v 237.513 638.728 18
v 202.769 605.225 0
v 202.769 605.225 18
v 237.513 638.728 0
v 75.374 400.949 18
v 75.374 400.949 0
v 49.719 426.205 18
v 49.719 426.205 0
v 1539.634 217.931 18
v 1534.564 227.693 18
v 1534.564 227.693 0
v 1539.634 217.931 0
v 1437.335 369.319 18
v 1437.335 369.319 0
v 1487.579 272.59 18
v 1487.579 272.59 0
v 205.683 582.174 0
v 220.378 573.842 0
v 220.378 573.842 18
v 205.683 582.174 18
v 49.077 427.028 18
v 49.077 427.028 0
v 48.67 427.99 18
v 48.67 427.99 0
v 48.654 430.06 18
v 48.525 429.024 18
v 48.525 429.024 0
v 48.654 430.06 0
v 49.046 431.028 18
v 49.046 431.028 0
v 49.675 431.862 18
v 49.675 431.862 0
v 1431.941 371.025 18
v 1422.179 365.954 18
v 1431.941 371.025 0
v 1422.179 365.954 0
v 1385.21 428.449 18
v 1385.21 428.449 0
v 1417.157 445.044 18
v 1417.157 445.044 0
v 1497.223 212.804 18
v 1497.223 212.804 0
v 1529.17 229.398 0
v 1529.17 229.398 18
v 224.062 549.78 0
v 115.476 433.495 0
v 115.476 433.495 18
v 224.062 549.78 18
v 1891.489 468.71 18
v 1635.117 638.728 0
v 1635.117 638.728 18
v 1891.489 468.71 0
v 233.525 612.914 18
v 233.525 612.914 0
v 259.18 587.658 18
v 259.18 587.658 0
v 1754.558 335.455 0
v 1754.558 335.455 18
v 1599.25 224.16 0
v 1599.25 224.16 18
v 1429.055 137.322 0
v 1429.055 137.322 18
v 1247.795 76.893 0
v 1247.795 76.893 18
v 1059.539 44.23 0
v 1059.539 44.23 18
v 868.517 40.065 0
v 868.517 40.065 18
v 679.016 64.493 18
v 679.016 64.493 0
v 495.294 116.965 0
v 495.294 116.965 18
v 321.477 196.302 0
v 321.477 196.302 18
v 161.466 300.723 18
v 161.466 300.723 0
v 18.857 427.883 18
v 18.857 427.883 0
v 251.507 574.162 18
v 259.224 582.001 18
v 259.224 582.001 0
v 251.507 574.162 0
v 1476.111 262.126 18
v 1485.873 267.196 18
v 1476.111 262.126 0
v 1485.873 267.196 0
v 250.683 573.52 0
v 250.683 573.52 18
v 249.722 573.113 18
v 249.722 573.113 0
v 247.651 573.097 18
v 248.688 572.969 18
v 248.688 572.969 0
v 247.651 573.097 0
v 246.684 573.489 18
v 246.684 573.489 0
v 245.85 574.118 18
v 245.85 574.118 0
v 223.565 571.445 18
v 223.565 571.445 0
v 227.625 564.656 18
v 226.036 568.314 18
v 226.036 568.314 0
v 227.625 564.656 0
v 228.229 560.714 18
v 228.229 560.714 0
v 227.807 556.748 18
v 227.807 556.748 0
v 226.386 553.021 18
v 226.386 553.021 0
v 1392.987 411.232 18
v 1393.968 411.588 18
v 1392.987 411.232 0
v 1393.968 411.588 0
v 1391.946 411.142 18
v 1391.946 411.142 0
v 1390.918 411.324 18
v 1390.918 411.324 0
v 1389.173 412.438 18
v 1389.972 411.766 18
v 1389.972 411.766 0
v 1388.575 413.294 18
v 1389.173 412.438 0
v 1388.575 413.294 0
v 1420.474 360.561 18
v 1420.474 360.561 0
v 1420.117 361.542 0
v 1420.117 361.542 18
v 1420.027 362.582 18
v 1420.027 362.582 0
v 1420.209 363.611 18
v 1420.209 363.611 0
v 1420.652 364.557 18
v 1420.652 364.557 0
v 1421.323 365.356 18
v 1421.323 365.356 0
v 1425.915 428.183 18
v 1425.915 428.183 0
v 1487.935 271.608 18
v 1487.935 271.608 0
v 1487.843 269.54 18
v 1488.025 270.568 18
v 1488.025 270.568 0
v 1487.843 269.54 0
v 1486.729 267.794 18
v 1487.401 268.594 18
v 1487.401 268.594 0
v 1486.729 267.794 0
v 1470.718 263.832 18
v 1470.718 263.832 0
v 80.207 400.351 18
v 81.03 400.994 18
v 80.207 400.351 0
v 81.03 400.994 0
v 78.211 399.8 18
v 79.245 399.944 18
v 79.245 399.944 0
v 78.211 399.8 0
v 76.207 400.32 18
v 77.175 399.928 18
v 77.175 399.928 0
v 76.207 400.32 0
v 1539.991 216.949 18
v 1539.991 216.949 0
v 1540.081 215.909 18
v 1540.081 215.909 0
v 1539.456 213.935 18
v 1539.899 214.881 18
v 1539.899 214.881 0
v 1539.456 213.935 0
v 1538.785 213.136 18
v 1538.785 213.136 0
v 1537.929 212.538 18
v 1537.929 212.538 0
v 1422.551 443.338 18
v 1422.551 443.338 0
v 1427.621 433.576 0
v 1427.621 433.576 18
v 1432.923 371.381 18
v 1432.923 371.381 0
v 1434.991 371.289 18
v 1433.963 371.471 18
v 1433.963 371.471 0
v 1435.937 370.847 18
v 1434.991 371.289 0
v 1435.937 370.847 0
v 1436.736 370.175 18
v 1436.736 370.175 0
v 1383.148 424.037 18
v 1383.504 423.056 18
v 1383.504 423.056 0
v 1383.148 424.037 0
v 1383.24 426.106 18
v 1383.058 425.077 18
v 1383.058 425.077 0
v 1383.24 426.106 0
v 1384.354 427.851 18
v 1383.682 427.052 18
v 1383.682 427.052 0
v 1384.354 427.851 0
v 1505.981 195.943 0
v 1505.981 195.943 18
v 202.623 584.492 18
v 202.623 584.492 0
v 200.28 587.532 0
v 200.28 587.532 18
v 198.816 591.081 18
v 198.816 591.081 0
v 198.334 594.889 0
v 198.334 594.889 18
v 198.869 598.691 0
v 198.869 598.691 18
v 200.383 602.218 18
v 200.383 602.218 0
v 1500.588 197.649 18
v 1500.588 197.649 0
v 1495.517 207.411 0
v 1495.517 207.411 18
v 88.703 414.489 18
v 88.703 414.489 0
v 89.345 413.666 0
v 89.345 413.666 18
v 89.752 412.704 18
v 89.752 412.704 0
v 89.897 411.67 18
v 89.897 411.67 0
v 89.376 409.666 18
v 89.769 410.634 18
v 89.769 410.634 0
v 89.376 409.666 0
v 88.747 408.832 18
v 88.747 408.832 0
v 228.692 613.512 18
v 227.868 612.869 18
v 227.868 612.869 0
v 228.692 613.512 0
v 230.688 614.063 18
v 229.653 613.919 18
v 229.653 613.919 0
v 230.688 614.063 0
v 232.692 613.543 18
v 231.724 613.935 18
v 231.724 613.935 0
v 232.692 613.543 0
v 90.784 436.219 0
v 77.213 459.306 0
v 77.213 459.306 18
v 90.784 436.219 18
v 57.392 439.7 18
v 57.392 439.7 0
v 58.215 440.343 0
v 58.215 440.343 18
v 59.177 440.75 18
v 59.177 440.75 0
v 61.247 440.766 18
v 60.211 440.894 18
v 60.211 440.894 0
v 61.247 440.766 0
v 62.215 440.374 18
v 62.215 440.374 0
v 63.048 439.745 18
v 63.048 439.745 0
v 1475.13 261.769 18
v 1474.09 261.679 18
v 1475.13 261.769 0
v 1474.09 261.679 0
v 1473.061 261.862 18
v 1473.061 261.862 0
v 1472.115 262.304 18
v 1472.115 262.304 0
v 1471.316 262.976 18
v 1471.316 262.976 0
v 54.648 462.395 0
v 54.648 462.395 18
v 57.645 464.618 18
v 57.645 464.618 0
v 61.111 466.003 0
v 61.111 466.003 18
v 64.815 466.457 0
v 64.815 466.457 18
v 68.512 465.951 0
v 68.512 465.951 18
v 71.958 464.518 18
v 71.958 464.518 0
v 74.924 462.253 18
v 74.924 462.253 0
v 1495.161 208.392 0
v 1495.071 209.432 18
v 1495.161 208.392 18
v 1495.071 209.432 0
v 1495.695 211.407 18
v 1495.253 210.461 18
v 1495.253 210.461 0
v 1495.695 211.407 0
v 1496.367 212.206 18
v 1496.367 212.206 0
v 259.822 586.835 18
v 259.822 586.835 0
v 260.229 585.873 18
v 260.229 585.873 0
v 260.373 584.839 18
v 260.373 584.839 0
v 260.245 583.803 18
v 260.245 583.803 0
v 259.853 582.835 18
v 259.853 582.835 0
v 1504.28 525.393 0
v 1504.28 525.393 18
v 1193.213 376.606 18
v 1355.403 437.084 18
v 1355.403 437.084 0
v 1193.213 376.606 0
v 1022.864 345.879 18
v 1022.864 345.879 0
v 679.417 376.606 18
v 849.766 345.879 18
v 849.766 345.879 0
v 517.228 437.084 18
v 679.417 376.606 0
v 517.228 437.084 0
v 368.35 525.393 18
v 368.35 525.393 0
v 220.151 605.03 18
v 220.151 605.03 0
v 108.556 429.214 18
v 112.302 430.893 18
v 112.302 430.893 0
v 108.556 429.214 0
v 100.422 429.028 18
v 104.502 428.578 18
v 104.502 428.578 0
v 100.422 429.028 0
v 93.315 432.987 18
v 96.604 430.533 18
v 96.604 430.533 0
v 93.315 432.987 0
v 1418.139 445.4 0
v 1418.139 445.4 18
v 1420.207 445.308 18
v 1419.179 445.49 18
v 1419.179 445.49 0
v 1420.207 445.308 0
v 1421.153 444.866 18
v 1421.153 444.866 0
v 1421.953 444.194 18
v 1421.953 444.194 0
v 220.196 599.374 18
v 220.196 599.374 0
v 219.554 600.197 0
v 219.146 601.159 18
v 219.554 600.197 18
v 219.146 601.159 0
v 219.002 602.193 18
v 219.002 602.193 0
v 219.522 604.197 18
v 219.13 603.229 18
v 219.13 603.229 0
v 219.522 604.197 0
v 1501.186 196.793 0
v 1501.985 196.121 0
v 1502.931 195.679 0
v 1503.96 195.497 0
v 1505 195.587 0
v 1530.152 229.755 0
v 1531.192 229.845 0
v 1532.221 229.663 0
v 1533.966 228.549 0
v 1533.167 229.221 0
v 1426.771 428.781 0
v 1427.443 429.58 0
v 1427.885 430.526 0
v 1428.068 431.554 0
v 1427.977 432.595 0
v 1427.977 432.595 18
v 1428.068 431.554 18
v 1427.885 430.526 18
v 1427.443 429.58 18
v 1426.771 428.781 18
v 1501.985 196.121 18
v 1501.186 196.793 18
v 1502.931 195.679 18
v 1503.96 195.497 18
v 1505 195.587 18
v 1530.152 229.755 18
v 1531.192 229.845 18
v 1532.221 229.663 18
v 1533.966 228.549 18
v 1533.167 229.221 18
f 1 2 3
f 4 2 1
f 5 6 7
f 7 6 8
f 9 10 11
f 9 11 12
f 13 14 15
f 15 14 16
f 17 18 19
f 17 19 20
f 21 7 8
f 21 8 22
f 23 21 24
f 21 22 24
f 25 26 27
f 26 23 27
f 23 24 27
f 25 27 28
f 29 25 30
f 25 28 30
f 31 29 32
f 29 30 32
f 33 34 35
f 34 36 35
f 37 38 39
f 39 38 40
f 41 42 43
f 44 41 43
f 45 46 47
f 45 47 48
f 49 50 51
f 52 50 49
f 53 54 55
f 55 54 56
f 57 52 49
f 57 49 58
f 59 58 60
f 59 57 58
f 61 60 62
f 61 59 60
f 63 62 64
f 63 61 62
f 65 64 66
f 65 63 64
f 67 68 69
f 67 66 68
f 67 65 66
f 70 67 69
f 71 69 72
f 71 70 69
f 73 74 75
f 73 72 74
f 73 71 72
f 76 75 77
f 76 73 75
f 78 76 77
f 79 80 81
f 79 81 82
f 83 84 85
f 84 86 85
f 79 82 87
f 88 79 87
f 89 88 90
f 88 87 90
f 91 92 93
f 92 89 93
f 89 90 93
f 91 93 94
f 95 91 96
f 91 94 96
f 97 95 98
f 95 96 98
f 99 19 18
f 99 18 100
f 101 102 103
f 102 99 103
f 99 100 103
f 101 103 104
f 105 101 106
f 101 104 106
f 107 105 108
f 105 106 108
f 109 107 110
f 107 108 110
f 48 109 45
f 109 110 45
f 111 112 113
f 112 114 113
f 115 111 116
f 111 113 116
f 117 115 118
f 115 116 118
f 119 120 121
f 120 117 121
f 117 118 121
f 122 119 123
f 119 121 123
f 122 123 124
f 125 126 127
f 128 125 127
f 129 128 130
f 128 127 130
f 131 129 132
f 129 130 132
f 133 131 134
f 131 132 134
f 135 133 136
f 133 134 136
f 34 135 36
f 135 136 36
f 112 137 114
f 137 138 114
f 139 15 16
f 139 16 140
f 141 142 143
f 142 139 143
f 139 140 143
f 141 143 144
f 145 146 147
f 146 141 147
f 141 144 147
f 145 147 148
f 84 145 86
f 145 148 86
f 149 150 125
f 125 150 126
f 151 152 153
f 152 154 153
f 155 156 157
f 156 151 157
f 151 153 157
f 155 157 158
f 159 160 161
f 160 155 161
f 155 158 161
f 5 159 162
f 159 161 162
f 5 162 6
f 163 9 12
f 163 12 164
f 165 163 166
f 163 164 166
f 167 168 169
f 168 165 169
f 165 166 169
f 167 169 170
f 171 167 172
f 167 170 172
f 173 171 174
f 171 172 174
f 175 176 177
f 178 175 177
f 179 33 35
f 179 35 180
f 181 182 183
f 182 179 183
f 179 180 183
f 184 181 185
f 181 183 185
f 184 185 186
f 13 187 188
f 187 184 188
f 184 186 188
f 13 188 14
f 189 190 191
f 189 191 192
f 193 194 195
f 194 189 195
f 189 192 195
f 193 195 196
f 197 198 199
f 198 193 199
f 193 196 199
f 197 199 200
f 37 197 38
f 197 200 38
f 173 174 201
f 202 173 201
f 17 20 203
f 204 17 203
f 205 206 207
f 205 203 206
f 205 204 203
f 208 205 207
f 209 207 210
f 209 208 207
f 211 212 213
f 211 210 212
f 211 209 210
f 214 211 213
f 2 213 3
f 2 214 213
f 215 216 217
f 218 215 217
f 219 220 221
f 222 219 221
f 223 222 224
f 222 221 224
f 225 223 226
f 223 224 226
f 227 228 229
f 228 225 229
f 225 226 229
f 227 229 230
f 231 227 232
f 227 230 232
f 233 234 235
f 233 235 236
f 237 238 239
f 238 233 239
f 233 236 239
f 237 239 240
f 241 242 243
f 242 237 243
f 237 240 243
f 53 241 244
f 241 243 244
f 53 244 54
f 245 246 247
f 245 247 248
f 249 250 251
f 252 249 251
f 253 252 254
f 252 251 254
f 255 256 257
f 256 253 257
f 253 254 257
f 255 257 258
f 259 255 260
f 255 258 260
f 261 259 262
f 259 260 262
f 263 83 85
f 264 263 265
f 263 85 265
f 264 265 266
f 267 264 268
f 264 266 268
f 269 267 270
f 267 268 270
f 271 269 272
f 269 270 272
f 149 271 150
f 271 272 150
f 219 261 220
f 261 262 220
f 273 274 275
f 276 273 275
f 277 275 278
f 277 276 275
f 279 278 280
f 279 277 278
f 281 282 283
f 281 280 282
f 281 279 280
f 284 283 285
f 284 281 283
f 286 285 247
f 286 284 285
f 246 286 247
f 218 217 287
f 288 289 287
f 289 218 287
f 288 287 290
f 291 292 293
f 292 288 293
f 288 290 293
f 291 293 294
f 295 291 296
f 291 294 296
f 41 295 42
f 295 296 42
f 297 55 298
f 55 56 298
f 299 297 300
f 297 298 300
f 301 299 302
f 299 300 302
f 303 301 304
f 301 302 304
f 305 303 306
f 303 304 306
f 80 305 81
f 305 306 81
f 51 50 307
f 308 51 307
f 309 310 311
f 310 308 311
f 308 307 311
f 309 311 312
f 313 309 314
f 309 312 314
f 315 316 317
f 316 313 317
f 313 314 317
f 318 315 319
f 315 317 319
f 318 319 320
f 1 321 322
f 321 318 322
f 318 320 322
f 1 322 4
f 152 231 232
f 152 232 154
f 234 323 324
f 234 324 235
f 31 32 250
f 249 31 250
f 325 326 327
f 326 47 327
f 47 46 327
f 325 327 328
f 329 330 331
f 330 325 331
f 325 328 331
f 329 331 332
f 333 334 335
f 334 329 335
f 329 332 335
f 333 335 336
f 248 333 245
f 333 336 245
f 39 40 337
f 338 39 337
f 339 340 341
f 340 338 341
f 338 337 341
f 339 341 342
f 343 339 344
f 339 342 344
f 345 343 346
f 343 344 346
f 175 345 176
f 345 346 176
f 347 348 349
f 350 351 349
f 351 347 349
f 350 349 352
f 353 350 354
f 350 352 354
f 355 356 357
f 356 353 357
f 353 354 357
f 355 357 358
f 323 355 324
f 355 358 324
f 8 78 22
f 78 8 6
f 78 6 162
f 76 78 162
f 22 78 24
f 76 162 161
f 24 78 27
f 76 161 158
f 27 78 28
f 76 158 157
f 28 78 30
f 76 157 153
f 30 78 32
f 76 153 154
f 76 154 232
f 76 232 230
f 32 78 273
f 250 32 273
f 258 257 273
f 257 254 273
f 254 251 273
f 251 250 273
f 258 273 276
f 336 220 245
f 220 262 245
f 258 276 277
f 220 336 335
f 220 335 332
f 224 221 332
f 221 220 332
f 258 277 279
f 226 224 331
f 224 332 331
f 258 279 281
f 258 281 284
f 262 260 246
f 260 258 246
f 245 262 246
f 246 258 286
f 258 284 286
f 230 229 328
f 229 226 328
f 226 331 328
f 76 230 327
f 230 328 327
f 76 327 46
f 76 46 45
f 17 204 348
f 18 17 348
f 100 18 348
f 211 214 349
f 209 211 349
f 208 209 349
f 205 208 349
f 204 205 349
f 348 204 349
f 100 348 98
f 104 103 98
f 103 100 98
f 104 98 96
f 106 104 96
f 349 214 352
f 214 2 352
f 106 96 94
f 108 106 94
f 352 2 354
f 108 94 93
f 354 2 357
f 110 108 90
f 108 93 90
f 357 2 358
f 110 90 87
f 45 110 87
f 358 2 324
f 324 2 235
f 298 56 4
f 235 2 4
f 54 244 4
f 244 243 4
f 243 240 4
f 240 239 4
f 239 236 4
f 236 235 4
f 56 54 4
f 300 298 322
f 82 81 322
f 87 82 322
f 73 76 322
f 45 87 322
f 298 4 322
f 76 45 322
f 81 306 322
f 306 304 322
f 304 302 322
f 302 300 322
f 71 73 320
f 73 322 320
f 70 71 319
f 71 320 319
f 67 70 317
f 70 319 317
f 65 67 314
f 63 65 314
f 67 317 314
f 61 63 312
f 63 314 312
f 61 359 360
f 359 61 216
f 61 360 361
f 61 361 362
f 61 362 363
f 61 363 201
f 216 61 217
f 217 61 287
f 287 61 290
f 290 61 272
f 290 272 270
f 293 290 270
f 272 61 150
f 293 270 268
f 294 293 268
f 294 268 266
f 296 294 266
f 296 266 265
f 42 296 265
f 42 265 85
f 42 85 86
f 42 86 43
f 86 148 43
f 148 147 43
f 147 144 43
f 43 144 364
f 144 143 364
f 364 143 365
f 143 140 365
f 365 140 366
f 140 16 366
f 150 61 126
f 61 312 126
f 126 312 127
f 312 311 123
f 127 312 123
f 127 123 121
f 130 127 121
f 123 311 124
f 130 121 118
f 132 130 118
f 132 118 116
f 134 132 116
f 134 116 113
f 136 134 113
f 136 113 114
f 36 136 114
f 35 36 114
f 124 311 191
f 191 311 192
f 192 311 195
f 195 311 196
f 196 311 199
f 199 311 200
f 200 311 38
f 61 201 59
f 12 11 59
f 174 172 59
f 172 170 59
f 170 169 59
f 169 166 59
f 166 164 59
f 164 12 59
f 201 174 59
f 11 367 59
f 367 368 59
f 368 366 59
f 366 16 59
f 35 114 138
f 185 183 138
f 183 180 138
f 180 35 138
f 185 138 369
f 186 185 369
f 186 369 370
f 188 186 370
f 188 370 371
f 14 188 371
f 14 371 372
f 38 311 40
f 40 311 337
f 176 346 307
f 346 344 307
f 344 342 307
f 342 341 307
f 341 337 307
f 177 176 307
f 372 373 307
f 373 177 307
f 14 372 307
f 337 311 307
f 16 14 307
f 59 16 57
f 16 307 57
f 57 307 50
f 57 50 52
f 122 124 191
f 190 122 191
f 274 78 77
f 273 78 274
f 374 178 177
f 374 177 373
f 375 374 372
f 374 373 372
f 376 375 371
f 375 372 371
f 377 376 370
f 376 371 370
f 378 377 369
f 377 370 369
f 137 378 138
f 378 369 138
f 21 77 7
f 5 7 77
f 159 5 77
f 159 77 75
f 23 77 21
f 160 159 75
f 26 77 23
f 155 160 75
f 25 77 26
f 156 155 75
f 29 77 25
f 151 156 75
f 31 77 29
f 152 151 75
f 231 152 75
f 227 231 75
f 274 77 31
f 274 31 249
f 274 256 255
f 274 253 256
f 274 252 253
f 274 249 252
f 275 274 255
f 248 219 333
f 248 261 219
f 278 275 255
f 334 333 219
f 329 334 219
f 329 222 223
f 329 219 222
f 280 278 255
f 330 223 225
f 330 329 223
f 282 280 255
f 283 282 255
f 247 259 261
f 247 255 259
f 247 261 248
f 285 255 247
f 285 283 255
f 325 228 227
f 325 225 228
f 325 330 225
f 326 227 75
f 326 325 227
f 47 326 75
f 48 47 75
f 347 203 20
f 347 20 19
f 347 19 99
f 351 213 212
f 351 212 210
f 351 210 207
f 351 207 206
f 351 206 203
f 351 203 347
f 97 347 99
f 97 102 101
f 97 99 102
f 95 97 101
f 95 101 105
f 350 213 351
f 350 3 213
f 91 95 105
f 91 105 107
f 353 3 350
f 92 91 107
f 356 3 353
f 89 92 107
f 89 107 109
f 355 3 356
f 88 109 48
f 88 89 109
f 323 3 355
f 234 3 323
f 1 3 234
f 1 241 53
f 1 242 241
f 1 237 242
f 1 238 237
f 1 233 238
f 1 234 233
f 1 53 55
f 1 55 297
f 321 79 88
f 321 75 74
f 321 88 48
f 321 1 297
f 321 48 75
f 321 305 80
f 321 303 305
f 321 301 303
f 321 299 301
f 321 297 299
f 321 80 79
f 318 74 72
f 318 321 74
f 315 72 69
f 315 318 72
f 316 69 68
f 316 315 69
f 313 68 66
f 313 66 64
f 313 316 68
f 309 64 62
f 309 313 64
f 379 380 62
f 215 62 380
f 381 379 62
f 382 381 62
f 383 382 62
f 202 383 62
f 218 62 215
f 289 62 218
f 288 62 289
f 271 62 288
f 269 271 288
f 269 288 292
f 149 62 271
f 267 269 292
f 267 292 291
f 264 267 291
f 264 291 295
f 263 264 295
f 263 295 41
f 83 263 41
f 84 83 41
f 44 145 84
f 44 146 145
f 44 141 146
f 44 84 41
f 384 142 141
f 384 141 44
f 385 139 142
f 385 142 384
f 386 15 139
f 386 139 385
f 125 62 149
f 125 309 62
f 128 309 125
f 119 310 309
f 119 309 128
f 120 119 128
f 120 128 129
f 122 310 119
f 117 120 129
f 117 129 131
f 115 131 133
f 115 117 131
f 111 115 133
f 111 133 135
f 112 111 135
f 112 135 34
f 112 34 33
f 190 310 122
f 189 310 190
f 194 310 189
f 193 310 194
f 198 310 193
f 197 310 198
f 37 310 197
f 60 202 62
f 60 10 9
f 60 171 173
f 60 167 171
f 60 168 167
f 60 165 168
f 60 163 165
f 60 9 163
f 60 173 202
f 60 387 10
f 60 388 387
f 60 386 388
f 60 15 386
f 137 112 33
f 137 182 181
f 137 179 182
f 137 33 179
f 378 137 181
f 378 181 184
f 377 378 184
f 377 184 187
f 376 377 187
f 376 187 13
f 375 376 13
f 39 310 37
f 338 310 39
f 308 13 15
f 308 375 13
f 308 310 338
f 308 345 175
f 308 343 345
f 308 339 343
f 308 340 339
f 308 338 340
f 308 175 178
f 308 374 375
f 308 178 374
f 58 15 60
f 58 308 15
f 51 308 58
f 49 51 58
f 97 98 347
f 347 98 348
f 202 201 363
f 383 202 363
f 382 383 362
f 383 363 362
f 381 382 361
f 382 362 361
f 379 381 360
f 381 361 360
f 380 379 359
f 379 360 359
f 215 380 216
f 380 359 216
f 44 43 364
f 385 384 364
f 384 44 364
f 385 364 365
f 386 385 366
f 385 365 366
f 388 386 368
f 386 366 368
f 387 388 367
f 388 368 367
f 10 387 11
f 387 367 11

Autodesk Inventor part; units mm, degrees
ref_plane "YZ Plane" through (0, 0, 0) normal (1, 0, 0) x (0, 1, 0)
ref_plane "XZ Plane" through (0, 0, 0) normal (0, 1, 0) x (-1, 0, 0)
ref_plane "XY Plane" through (0, 0, 0) normal (0, 0, 1) x (1, 0, 0)
sketch "CONTOURS" plane through (0, 0, 0) normal (0, 0, 1) x (1, 0, 0)
  arc A0 (18.8569, 427.8827) -> (1891.4893, 468.7097) centre (936.3152, 1313.2613) ccw
  line L0 (18.8569, 427.8827) -> (54.648, 462.3952)
  arc A1 (77.2131, 459.3056) -> (54.648, 462.3952) centre (64.7129, 451.9575) ccw
  line L1 (77.2131, 459.3056) -> (90.7845, 436.2188)
  arc A2 (90.7845, 436.2188) -> (115.4755, 433.495) centre (104.1468, 444.0737) ccw
  line L2 (115.4755, 433.495) -> (224.0619, 549.7797)
  arc A3 (224.0619, 549.7797) -> (220.3778, 573.8421) centre (212.7332, 560.3584) ccw
  line L3 (220.3778, 573.8421) -> (205.6826, 582.1735)
  arc A4 (202.7691, 605.2251) -> (205.6826, 582.1735) centre (212.834, 594.7873) ccw
  line L4 (202.7691, 605.2251) -> (237.5129, 638.7277)
  arc A5 (237.5129, 638.7277) -> (1635.1174, 638.7277) centre (936.3152, 1313.2613) ccw
  line L5 (1635.1174, 638.7277) -> (1891.4893, 468.7097)
sketch "HOLES" plane through (0, 0, 0) normal (0, 0, 1) x (1, 0, 0)
  arc A0 (75.3736, 400.9492) -> (81.0303, 400.9936) centre (78.1798, 403.7997) ccw
  line L0 (75.3736, 400.9492) -> (49.7191, 426.2049)
  arc A1 (49.6748, 431.8616) -> (49.7191, 426.2049) centre (52.5253, 429.0554) ccw
  line L1 (49.6748, 431.8616) -> (57.3918, 439.7004)
  arc A2 (63.0485, 439.7447) -> (57.3918, 439.7004) centre (60.2423, 436.8942) ccw
  line L2 (63.0485, 439.7447) -> (88.703, 414.4891)
  arc A3 (88.7473, 408.8324) -> (88.703, 414.4891) centre (85.8968, 411.6386) ccw
  line L3 (1537.9287, 212.5375) -> (1505.9814, 195.9431)
  arc A4 (1500.5879, 197.6489) -> (1505.9814, 195.9431) centre (1504.1376, 199.4928) ccw
  line L4 (1500.5879, 197.6489) -> (1495.5174, 207.4106)
  arc A5 (1497.2233, 212.8041) -> (1495.5174, 207.4106) centre (1499.0671, 209.2544) ccw
  line L5 (1497.2233, 212.8041) -> (1529.1705, 229.3985)
  arc A6 (1534.564, 227.6927) -> (1529.1705, 229.3985) centre (1531.0143, 225.8489) ccw
  line L6 (1534.564, 227.6927) -> (1539.6345, 217.931)
  arc A7 (1537.9287, 212.5375) -> (1539.6345, 217.931) centre (1536.0848, 216.0872) ccw
  line L7 (1485.873, 267.1962) -> (1476.1114, 262.1257)
  arc A8 (1470.7179, 263.8316) -> (1476.1114, 262.1257) centre (1474.2676, 265.6754) ccw
  line L8 (1470.7179, 263.8316) -> (1420.4735, 360.5606)
  arc A9 (1422.1794, 365.9541) -> (1420.4735, 360.5606) centre (1424.0232, 362.4044) ccw
  line L9 (1422.1794, 365.9541) -> (1431.9411, 371.0247)
  arc A10 (1437.3346, 369.3188) -> (1431.9411, 371.0247) centre (1433.7849, 367.475) ccw
  line L10 (1437.3346, 369.3188) -> (1487.5789, 272.5898)
  arc A11 (1485.873, 267.1962) -> (1487.5789, 272.5898) centre (1484.0292, 270.7459) ccw
  line L11 (1388.5747, 413.294) -> (1383.5041, 423.0556)
  arc A12 (1385.21, 428.4491) -> (1383.5041, 423.0556) centre (1387.0538, 424.8994) ccw
  line L12 (1385.21, 428.4491) -> (1417.1572, 445.0436)
  arc A13 (1422.5507, 443.3377) -> (1417.1572, 445.0436) centre (1419.001, 441.4939) ccw
  line L13 (1422.5507, 443.3377) -> (1427.6212, 433.5761)
  arc A14 (1425.9154, 428.1826) -> (1427.6212, 433.5761) centre (1424.0716, 431.7322) ccw
  line L14 (1425.9154, 428.1826) -> (1393.9682, 411.5881)
  arc A15 (1388.5747, 413.294) -> (1393.9682, 411.5881) centre (1392.1243, 415.1378) ccw
  line L15 (220.1514, 605.0305) -> (227.8684, 612.8694)
  arc A16 (233.5251, 612.9137) -> (227.8684, 612.8694) centre (230.7189, 610.0632) ccw
  line L16 (233.5251, 612.9137) -> (259.1796, 587.658)
  arc A17 (259.2239, 582.0014) -> (259.1796, 587.658) centre (256.3734, 584.8075) ccw
  line L17 (259.2239, 582.0014) -> (251.5069, 574.1625)
  arc A18 (245.8502, 574.1182) -> (251.5069, 574.1625) centre (248.6564, 576.9687) ccw
  line L18 (245.8502, 574.1182) -> (220.1957, 599.3738)
  arc A19 (220.1514, 605.0305) -> (220.1957, 599.3738) centre (223.0019, 602.2243) ccw
  line L19 (543.0858, 821.5545) -> (547.6833, 831.5476)
  arc A20 (547.6833, 831.5476) -> (545.7213, 836.8533) centre (544.0494, 833.2195) ccw
  line L20 (545.7213, 836.8533) -> (513.0165, 851.8999)
  arc A21 (513.0165, 851.8999) -> (507.7108, 849.9379) centre (511.3447, 848.266) ccw
  line L21 (507.7108, 849.9379) -> (503.1133, 839.9447)
  arc A22 (503.1133, 839.9447) -> (505.0753, 834.639) centre (506.7471, 838.2729) ccw
  line L22 (505.0753, 834.639) -> (537.7801, 819.5925)
  arc A23 (537.7801, 819.5925) -> (543.0858, 821.5545) centre (539.4519, 823.2264) ccw
  line L23 (481.0423, 782.4016) -> (435.4847, 683.3788)
  arc A24 (435.4847, 683.3788) -> (437.4468, 678.0731) centre (439.1186, 681.7069) ccw
  line L24 (437.4468, 678.0731) -> (447.4399, 673.4755)
  arc A25 (447.4399, 673.4755) -> (452.7456, 675.4376) centre (449.1117, 677.1094) ccw
  line L25 (452.7456, 675.4376) -> (498.3031, 774.4603)
  arc A26 (498.3031, 774.4603) -> (496.3411, 779.766) centre (494.6693, 776.1322) ccw
  line L26 (496.3411, 779.766) -> (486.348, 784.3636)
  arc A27 (486.348, 784.3636) -> (481.0423, 782.4016) centre (484.6762, 780.7297) ccw
  line L27 (446.1185, 610.7891) -> (441.521, 600.7959)
  arc A28 (436.2153, 598.8339) -> (441.521, 600.7959) centre (437.8871, 602.4678) ccw
  line L28 (436.2153, 598.8339) -> (403.5105, 613.8804)
  arc A29 (401.5485, 619.1861) -> (403.5105, 613.8804) centre (405.1824, 617.5143) ccw
  line L29 (401.5485, 619.1861) -> (406.1461, 629.1793)
  arc A30 (411.4518, 631.1413) -> (406.1461, 629.1793) centre (409.7799, 627.5074) ccw
  line L30 (411.4518, 631.1413) -> (444.1565, 616.0948)
  arc A31 (446.1185, 610.7891) -> (444.1565, 616.0948) centre (442.4847, 612.4609) ccw
  line L31 (88.7473, 408.8324) -> (81.0303, 400.9936)
sketch "LETTERS" plane through (0, 0, 0) normal (0, 0, 1) x (1, 0, 0)
  line L0 (228.3428, 428.6061) -> (222.1589, 433.5761)
  line L1 (222.1589, 433.5761) -> (234.7826, 448.8621)
  line L2 (234.7826, 448.8621) -> (240.0493, 444.5126)
  line L3 (240.0493, 444.5126) -> (240.1714, 444.4197)
  line L4 (240.1714, 444.4197) -> (240.2915, 444.3221)
  line L5 (240.2915, 444.3221) -> (240.4096, 444.2197)
  line L6 (240.4096, 444.2197) -> (240.5256, 444.1125)
  line L7 (240.5256, 444.1125) -> (240.6391, 444.0004)
  line L8 (240.6391, 444.0004) -> (240.7501, 443.8834)
  line L9 (240.7501, 443.8834) -> (240.8585, 443.7615)
  line L10 (240.8585, 443.7615) -> (240.9639, 443.6348)
  line L11 (240.9639, 443.6348) -> (241.0664, 443.5031)
  line L12 (241.0664, 443.5031) -> (241.1657, 443.3666)
  line L13 (228.4677, 428.5172) -> (228.3428, 428.6061)
  line L14 (228.5966, 428.4315) -> (228.4677, 428.5172)
  line L15 (228.7295, 428.3492) -> (228.5966, 428.4315)
  line L16 (228.8663, 428.2704) -> (228.7295, 428.3492)
  line L17 (229.0071, 428.1953) -> (228.8663, 428.2704)
  line L18 (229.1518, 428.1241) -> (229.0071, 428.1953)
  line L19 (229.3004, 428.0569) -> (229.1518, 428.1241)
  line L20 (229.4528, 427.9939) -> (229.3004, 428.0569)
  line L21 (229.609, 427.9352) -> (229.4528, 427.9939)
  line L22 (229.7689, 427.8809) -> (229.609, 427.9352)
  line L23 (229.9324, 427.8313) -> (229.7689, 427.8809)
  line L24 (230.0995, 427.7865) -> (229.9324, 427.8313)
  line L25 (230.2701, 427.7466) -> (230.0995, 427.7865)
  line L26 (230.444, 427.7117) -> (230.2701, 427.7466)
  line L27 (230.6212, 427.6819) -> (230.444, 427.7117)
  line L28 (230.8016, 427.6574) -> (230.6212, 427.6819)
  line L29 (230.9849, 427.6383) -> (230.8016, 427.6574)
  line L30 (231.1712, 427.6246) -> (230.9849, 427.6383)
  line L31 (231.3602, 427.6165) -> (231.1712, 427.6246)
  line L32 (231.5519, 427.6141) -> (231.3602, 427.6165)
  line L33 (231.7459, 427.6174) -> (231.5519, 427.6141)
  line L34 (231.9423, 427.6264) -> (231.7459, 427.6174)
  line L35 (232.1408, 427.6413) -> (231.9423, 427.6264)
  line L36 (232.3412, 427.662) -> (232.1408, 427.6413)
  line L37 (232.5433, 427.6887) -> (232.3412, 427.662)
  line L38 (232.747, 427.7212) -> (232.5433, 427.6887)
  line L39 (232.9521, 427.7597) -> (232.747, 427.7212)
  line L40 (233.1584, 427.8041) -> (232.9521, 427.7597)
  line L41 (233.3656, 427.8544) -> (233.1584, 427.8041)
  line L42 (233.5736, 427.9106) -> (233.3656, 427.8544)
  line L43 (233.7821, 427.9726) -> (233.5736, 427.9106)
  line L44 (233.991, 428.0404) -> (233.7821, 427.9726)
  line L45 (234.2, 428.1139) -> (233.991, 428.0404)
  line L46 (234.409, 428.193) -> (234.2, 428.1139)
  line L47 (234.6177, 428.2776) -> (234.409, 428.193)
  line L48 (234.8258, 428.3677) -> (234.6177, 428.2776)
  line L49 (235.0333, 428.4632) -> (234.8258, 428.3677)
  line L50 (235.2399, 428.5638) -> (235.0333, 428.4632)
  line L51 (235.4454, 428.6696) -> (235.2399, 428.5638)
  line L52 (235.6496, 428.7803) -> (235.4454, 428.6696)
  line L53 (235.8522, 428.8958) -> (235.6496, 428.7803)
  line L54 (236.0532, 429.0159) -> (235.8522, 428.8958)
  line L55 (236.2524, 429.1405) -> (236.0532, 429.0159)
  line L56 (236.4495, 429.2695) -> (236.2524, 429.1405)
  line L57 (236.6444, 429.4026) -> (236.4495, 429.2695)
  line L58 (236.8369, 429.5396) -> (236.6444, 429.4026)
  line L59 (237.0269, 429.6804) -> (236.8369, 429.5396)
  line L60 (237.2142, 429.8249) -> (237.0269, 429.6804)
  line L61 (237.3987, 429.9727) -> (237.2142, 429.8249)
  line L62 (237.5803, 430.1237) -> (237.3987, 429.9727)
  line L63 (237.7587, 430.2777) -> (237.5803, 430.1237)
  line L64 (237.934, 430.4346) -> (237.7587, 430.2777)
  line L65 (238.2747, 430.7559) -> (237.934, 430.4346)
  line L66 (238.6014, 431.0861) -> (238.2747, 430.7559)
  line L67 (238.9137, 431.4236) -> (238.6014, 431.0861)
  line L68 (239.2109, 431.7669) -> (238.9137, 431.4236)
  line L69 (239.4929, 432.1144) -> (239.2109, 431.7669)
  line L70 (239.7594, 432.4649) -> (239.4929, 432.1144)
  line L71 (240.0148, 432.8236) -> (239.7594, 432.4649)
  line L72 (240.2628, 433.1961) -> (240.0148, 432.8236)
  line L73 (240.5022, 433.582) -> (240.2628, 433.1961)
  line L74 (240.7316, 433.9805) -> (240.5022, 433.582)
  line L75 (240.9497, 434.3906) -> (240.7316, 433.9805)
  line L76 (241.1552, 434.8114) -> (240.9497, 434.3906)
  line L77 (241.2528, 435.0254) -> (241.1552, 434.8114)
  line L78 (241.3468, 435.2416) -> (241.2528, 435.0254)
  line L79 (241.4371, 435.4598) -> (241.3468, 435.2416)
  line L80 (241.5233, 435.68) -> (241.4371, 435.4598)
  line L81 (241.6055, 435.9017) -> (241.5233, 435.68)
  line L82 (241.6835, 436.125) -> (241.6055, 435.9017)
  line L83 (241.7571, 436.3496) -> (241.6835, 436.125)
  line L84 (241.8262, 436.5752) -> (241.7571, 436.3496)
  line L85 (241.8908, 436.8018) -> (241.8262, 436.5752)
  line L86 (241.9505, 437.0289) -> (241.8908, 436.8018)
  line L87 (242.0055, 437.2566) -> (241.9505, 437.0289)
  line L88 (242.0555, 437.4844) -> (242.0055, 437.2566)
  line L89 (242.1005, 437.7123) -> (242.0555, 437.4844)
  line L90 (242.1404, 437.9399) -> (242.1005, 437.7123)
  line L91 (242.175, 438.1671) -> (242.1404, 437.9399)
  line L92 (242.2045, 438.3936) -> (242.175, 438.1671)
  line L93 (242.2286, 438.6191) -> (242.2045, 438.3936)
  line L94 (242.2474, 438.8435) -> (242.2286, 438.6191)
  line L95 (242.2608, 439.0665) -> (242.2474, 438.8435)
  line L96 (242.2688, 439.288) -> (242.2608, 439.0665)
  line L97 (242.2714, 439.5075) -> (242.2688, 439.288)
  line L98 (242.2686, 439.7251) -> (242.2714, 439.5075)
  line L99 (242.2604, 439.9404) -> (242.2686, 439.7251)
  line L100 (242.2468, 440.1532) -> (242.2604, 439.9404)
  line L101 (242.2279, 440.3633) -> (242.2468, 440.1532)
  line L102 (242.2037, 440.5706) -> (242.2279, 440.3633)
  line L103 (242.1742, 440.7747) -> (242.2037, 440.5706)
  line L104 (242.1395, 440.9757) -> (242.1742, 440.7747)
  line L105 (242.0998, 441.1732) -> (242.1395, 440.9757)
  line L106 (242.055, 441.3671) -> (242.0998, 441.1732)
  line L107 (242.0052, 441.5573) -> (242.055, 441.3671)
  line L108 (241.9506, 441.7435) -> (242.0052, 441.5573)
  line L109 (241.8913, 441.9258) -> (241.9506, 441.7435)
  line L110 (241.8274, 442.1039) -> (241.8913, 441.9258)
  line L111 (241.759, 442.2776) -> (241.8274, 442.1039)
  line L112 (241.6862, 442.447) -> (241.759, 442.2776)
  line L113 (241.6092, 442.612) -> (241.6862, 442.447)
  line L114 (241.5281, 442.7723) -> (241.6092, 442.612)
  line L115 (241.443, 442.928) -> (241.5281, 442.7723)
  line L116 (241.3542, 443.079) -> (241.443, 442.928)
  line L117 (241.2617, 443.2252) -> (241.3542, 443.079)
  line L118 (241.1657, 443.3666) -> (241.2617, 443.2252)
extrude "Extrusion4" add sketch "CONTOURS" along normal blind 18
extrude "Extrusion5" cut sketch "HOLES" along normal blind 18 contours L0 A1 L1 A2 L2 A3 L31 A0 | L3 A4 L4 A5 L5 A6 L6 A7 | L7 A8 L8 A9 L9 A10 L10 A11 | L11 A12 L12 A13 L13 A14 L14 A15 | L15 A16 L16 A17 L17 A18 L18 A19
properties part number "Platform D4" material "Wood (Birch)"
